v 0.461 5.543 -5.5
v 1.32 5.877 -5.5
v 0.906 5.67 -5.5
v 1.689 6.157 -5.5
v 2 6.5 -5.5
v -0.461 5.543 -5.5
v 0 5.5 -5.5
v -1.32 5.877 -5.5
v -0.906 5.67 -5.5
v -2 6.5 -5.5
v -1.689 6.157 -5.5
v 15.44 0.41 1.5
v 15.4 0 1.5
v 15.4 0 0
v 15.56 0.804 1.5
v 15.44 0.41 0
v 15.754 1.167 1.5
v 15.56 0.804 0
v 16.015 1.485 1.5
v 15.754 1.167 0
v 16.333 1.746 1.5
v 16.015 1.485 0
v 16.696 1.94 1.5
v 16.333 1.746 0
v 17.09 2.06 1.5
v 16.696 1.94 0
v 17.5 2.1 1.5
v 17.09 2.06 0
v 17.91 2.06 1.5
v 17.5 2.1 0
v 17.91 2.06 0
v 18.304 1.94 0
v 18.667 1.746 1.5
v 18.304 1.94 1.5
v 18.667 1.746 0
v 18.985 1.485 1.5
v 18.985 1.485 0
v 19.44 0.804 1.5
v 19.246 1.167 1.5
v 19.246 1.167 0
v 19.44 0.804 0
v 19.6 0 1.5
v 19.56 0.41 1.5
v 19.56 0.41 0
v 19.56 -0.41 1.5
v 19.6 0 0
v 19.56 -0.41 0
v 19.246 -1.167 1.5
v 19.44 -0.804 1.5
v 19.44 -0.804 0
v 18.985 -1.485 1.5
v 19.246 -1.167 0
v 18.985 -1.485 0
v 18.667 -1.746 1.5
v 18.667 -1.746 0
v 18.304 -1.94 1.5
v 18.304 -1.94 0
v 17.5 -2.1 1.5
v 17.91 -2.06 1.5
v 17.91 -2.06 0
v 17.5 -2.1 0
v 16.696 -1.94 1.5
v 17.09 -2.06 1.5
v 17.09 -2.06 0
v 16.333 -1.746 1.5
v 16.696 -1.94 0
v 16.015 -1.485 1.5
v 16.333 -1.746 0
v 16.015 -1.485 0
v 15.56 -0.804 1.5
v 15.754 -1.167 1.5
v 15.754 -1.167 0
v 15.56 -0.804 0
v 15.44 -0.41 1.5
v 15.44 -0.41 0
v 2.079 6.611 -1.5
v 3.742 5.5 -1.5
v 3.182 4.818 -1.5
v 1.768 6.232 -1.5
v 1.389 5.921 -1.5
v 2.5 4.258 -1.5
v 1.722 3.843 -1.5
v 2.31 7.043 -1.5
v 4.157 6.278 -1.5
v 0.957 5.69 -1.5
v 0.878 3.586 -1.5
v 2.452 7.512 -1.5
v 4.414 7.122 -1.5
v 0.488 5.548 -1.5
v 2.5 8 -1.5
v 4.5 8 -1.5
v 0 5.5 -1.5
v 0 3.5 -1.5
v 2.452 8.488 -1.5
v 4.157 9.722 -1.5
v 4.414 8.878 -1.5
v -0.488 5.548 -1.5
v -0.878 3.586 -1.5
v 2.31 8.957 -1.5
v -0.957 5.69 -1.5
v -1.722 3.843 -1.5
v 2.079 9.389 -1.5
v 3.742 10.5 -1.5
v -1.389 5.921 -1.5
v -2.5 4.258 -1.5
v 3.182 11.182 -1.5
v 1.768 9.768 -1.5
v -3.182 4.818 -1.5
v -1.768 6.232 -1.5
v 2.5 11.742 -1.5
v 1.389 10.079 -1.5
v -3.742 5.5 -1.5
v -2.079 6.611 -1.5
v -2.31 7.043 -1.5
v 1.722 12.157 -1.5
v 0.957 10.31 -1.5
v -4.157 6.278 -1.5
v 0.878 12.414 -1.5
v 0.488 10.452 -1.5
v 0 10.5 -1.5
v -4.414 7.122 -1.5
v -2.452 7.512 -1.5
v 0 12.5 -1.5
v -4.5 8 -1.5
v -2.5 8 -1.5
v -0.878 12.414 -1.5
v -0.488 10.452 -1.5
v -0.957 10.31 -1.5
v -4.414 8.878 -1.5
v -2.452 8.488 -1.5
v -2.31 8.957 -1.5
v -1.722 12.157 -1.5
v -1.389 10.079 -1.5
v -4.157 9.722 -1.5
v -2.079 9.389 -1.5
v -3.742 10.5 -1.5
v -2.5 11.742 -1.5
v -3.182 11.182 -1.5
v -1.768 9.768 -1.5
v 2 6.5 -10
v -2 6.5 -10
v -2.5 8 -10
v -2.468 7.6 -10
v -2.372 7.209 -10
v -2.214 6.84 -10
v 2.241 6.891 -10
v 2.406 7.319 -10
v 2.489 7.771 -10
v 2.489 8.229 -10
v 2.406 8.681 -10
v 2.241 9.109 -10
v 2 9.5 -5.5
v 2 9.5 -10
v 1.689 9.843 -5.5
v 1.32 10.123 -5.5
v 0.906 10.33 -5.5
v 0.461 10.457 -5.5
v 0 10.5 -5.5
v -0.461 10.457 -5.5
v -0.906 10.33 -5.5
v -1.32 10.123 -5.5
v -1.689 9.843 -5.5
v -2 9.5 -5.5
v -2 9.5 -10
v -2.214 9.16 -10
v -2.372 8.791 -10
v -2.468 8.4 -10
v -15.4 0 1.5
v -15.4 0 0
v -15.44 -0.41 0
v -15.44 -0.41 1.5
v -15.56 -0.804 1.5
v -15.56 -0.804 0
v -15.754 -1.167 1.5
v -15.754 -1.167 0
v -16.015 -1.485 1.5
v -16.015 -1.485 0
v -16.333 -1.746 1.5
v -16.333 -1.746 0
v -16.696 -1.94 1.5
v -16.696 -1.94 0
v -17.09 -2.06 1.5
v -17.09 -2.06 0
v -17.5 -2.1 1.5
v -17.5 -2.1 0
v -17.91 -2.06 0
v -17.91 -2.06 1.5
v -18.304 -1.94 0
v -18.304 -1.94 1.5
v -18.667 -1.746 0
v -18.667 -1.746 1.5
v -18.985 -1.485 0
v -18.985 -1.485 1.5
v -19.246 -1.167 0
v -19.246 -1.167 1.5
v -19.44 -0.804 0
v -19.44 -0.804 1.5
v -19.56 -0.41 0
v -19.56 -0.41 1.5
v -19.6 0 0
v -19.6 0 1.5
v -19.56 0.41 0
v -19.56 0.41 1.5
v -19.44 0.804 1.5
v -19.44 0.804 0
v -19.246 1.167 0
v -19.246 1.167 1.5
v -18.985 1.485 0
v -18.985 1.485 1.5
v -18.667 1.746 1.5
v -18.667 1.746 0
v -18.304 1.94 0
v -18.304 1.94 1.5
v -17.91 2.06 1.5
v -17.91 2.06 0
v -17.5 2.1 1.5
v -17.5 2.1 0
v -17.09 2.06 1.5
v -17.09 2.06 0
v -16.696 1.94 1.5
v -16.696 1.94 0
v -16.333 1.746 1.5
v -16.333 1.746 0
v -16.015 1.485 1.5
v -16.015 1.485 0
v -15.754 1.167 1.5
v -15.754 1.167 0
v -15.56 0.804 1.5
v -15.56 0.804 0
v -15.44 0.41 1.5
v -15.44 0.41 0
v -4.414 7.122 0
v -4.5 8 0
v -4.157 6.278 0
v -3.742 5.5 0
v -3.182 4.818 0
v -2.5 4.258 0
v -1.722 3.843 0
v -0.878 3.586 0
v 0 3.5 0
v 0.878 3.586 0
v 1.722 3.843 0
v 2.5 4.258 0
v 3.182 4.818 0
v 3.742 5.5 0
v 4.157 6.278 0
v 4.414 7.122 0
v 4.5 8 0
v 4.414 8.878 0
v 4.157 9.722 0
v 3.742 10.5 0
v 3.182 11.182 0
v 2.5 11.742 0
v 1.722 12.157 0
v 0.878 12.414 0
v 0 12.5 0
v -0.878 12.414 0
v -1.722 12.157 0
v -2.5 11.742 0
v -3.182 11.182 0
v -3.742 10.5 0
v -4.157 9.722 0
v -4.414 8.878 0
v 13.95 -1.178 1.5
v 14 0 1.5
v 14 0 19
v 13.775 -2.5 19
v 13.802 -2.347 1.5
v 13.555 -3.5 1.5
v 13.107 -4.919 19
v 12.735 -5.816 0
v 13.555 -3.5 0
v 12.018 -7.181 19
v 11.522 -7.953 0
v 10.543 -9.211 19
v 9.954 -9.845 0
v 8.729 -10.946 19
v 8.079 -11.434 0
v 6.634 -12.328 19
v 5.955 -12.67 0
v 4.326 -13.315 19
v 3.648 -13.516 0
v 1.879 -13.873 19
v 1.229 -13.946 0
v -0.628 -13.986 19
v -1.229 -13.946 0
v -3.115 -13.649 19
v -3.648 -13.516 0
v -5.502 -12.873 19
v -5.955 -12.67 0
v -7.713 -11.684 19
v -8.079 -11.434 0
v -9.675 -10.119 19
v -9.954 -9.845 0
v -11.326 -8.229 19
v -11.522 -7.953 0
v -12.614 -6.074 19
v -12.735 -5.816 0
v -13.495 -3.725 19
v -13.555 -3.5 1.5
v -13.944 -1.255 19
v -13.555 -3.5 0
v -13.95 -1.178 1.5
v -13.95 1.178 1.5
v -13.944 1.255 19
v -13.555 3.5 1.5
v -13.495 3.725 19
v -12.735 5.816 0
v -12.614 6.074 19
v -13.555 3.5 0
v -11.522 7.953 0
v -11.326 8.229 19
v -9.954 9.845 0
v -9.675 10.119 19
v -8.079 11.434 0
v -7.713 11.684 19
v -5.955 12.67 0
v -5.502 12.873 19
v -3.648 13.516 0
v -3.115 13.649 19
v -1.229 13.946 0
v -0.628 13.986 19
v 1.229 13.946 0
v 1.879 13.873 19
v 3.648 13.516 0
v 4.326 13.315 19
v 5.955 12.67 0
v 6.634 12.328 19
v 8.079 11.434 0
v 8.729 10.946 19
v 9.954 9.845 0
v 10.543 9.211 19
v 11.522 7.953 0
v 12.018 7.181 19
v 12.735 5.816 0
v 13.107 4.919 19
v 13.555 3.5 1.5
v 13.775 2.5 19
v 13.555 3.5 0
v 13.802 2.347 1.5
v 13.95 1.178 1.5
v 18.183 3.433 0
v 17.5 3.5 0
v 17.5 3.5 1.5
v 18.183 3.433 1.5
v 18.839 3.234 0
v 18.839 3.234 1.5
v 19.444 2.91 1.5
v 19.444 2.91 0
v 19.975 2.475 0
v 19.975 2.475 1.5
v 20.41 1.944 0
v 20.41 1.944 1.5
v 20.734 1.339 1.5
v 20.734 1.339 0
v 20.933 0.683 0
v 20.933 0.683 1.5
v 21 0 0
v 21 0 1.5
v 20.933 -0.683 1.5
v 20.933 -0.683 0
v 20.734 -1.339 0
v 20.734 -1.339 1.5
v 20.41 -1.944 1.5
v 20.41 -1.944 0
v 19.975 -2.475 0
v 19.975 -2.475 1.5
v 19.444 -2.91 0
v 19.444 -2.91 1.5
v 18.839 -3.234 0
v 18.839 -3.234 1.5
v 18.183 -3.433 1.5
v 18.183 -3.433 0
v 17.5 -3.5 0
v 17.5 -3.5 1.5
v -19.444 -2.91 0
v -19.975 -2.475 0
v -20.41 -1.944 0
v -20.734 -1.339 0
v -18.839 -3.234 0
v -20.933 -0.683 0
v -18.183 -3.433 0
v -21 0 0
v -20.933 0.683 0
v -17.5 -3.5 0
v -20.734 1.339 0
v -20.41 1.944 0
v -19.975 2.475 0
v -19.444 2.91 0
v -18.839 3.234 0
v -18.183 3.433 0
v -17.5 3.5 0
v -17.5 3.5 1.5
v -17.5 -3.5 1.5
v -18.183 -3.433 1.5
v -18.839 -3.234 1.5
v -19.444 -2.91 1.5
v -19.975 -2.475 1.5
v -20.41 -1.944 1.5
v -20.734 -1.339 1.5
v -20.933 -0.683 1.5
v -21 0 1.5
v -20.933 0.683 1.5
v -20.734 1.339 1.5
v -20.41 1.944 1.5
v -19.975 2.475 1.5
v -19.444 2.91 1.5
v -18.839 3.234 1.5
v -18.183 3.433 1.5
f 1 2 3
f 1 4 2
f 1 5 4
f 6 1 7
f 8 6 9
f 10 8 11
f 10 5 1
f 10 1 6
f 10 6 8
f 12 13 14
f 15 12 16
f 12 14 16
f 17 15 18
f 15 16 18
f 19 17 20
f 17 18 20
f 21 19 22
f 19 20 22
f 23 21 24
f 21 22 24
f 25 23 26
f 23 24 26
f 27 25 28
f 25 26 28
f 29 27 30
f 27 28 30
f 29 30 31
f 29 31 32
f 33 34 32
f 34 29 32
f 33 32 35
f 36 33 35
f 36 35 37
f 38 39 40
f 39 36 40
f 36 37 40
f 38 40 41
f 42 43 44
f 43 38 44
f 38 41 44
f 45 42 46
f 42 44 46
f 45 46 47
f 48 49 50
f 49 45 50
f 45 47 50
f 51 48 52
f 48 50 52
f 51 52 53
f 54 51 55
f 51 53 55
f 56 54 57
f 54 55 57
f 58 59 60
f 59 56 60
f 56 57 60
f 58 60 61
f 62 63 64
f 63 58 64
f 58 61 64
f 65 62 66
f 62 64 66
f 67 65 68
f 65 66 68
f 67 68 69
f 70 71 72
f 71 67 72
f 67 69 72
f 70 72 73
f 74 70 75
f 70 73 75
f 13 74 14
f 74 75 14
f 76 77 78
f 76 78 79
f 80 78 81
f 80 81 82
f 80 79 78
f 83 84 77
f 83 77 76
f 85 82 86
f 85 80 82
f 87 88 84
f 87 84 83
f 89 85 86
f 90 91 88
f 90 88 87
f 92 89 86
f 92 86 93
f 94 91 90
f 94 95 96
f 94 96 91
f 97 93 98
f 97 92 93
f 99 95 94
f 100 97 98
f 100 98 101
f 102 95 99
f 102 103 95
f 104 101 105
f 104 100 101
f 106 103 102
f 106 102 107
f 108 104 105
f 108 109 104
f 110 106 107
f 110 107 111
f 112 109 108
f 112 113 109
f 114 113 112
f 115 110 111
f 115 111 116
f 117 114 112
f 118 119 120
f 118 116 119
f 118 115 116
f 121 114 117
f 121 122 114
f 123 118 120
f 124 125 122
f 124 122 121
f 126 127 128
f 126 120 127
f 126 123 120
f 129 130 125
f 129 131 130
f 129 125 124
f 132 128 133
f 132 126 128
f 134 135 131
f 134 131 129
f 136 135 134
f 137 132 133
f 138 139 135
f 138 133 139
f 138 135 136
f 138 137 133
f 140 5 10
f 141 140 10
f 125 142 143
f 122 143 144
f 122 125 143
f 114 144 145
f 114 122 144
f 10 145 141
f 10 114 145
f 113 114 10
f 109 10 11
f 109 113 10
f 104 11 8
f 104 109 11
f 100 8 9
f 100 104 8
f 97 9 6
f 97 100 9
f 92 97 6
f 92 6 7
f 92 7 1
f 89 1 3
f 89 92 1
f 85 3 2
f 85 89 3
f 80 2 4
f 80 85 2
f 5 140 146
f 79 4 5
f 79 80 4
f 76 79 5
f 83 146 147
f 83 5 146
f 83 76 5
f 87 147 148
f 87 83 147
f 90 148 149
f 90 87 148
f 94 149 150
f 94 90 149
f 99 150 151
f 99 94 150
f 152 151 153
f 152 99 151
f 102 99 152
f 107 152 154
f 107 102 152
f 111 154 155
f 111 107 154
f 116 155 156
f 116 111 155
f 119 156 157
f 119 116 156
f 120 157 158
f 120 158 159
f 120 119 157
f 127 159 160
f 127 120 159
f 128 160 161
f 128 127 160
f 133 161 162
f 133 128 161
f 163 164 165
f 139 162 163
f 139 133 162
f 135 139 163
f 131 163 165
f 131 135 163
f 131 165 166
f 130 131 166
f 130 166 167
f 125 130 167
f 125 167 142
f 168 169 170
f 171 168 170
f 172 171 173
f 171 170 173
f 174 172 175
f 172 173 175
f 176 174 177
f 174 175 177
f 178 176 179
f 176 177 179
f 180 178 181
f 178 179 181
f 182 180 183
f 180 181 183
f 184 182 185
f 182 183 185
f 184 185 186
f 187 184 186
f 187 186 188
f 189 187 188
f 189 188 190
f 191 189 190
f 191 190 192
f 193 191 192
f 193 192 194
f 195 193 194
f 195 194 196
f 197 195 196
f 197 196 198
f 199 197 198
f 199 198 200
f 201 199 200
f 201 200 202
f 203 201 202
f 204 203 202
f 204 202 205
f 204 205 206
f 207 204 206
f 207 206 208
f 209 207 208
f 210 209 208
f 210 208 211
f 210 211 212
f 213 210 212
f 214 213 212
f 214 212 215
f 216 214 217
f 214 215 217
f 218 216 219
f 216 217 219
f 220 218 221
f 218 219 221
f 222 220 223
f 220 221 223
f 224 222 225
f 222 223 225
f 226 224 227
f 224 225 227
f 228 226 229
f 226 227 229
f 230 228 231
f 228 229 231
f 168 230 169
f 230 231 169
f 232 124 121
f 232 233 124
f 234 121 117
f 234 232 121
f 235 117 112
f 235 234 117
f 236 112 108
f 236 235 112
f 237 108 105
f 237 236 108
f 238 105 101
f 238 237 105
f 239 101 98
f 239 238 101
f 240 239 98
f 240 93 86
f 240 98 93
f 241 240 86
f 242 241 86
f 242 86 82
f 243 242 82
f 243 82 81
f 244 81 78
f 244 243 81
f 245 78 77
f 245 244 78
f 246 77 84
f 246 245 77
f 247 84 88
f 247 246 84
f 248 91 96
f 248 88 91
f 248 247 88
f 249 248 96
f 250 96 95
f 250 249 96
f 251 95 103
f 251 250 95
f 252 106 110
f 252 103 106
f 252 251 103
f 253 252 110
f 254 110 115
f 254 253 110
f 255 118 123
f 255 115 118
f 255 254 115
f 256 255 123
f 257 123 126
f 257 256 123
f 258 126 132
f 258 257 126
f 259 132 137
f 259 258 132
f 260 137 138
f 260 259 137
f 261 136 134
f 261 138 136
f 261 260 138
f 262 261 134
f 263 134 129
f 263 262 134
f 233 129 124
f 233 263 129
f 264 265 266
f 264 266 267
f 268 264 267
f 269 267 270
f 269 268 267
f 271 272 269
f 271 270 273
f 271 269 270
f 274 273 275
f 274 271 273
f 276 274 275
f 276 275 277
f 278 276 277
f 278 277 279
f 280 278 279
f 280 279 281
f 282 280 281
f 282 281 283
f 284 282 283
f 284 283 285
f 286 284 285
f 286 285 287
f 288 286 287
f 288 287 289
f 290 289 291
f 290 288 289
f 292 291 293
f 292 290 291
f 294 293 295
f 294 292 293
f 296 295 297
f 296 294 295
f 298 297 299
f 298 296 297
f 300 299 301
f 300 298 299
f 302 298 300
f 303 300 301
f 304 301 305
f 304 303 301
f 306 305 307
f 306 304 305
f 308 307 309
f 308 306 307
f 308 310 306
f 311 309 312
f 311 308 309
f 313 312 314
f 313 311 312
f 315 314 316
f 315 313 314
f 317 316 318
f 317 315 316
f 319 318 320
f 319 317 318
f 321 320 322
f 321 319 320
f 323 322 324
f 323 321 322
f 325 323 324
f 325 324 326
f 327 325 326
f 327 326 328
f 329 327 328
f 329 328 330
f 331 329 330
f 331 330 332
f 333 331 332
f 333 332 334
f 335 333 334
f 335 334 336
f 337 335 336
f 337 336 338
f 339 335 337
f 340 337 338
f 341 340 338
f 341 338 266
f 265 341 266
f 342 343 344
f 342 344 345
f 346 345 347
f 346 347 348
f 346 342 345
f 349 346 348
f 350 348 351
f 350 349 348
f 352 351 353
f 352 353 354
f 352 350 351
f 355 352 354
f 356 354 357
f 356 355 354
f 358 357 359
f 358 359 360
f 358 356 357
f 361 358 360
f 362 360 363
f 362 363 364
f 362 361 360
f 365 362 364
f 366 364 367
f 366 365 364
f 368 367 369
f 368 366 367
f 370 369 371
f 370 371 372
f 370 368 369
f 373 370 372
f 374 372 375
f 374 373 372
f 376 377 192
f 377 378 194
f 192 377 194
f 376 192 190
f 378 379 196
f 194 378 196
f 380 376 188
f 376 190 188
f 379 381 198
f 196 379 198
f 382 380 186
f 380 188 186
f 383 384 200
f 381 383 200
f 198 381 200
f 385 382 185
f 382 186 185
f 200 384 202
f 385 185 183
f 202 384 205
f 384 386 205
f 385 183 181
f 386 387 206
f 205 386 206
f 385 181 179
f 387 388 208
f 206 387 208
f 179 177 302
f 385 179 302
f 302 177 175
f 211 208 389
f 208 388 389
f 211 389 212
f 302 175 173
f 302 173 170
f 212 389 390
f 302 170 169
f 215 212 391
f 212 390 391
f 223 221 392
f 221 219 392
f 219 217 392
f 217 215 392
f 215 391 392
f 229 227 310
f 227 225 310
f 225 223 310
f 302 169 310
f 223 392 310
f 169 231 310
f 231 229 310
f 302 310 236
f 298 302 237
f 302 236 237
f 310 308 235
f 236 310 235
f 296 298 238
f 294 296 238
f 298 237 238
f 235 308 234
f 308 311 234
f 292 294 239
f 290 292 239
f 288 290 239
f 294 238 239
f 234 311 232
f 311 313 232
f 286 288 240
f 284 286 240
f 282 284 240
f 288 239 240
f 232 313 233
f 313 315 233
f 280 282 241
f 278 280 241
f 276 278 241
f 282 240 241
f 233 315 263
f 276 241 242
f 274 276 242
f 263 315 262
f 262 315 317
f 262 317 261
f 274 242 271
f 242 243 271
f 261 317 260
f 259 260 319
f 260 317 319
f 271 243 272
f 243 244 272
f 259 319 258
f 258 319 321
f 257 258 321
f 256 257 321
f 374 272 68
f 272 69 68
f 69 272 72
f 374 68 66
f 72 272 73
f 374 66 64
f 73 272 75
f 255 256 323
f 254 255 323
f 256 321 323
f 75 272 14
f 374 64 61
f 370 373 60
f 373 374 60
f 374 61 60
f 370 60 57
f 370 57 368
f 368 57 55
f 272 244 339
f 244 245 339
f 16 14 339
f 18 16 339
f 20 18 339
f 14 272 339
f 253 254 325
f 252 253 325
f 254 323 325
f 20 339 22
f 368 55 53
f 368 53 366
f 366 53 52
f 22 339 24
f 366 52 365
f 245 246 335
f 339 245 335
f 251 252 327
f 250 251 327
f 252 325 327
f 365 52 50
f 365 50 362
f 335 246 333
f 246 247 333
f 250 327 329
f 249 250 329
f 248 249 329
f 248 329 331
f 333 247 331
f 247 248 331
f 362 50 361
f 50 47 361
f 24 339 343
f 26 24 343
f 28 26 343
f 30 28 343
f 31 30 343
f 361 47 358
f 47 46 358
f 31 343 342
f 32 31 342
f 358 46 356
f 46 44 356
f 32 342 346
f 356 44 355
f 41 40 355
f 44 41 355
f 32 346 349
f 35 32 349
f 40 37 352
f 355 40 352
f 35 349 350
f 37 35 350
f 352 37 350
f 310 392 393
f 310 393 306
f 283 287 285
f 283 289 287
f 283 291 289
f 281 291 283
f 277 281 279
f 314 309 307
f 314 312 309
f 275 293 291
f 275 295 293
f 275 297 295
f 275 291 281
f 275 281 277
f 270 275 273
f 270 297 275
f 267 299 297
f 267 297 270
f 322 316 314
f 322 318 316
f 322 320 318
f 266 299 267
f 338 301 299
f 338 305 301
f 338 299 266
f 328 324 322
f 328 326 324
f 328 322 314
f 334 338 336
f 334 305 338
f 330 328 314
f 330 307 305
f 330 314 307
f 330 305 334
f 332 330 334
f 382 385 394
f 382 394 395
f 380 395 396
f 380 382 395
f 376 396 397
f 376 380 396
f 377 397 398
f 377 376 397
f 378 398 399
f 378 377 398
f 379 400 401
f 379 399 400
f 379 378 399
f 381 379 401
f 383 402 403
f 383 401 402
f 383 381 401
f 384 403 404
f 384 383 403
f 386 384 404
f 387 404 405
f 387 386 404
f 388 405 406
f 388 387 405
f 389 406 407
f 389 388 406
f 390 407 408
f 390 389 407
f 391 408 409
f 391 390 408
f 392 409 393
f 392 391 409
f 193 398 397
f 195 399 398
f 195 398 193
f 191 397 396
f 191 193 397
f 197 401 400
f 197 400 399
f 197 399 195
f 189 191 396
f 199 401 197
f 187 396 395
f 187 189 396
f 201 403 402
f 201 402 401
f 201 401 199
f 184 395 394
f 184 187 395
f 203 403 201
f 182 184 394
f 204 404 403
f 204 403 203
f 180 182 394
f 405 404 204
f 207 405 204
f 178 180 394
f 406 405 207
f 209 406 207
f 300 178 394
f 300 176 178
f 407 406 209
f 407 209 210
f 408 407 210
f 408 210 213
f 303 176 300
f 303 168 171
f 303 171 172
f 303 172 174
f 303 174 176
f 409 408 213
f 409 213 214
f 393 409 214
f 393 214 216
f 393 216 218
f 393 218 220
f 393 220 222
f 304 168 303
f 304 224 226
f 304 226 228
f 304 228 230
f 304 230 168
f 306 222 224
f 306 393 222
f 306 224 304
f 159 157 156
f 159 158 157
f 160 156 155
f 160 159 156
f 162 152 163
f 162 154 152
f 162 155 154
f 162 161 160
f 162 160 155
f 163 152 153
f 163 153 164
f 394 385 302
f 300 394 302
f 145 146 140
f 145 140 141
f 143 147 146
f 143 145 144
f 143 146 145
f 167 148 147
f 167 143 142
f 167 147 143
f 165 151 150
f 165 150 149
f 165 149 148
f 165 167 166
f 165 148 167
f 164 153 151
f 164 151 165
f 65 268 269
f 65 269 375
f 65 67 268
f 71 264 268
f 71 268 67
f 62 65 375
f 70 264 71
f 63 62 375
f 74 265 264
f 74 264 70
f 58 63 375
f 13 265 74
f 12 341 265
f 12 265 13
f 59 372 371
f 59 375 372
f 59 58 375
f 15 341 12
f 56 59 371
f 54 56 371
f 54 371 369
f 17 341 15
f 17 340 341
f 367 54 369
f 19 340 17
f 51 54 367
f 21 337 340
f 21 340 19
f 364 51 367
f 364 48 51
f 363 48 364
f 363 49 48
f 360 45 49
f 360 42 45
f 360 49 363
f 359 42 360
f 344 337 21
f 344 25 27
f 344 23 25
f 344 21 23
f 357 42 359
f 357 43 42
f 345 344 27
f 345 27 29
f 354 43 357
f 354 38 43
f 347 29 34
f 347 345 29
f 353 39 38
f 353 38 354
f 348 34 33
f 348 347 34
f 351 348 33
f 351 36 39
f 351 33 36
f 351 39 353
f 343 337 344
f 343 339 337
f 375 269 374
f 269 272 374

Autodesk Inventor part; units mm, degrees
ref_plane "YZ Plane" through (0, 0, 0) normal (1, 0, 0) x (0, 1, 0)
ref_plane "XZ Plane" through (0, 0, 0) normal (0, 1, 0) x (-1, 0, 0)
ref_plane "XY Plane" through (0, 0, 0) normal (0, 0, 1) x (1, 0, 0)
sketch "Sketch1" plane through (0, 0, 0) normal (0, 0, 1) x (1, 0, 0)
  circle A0 centre (0, 0) radius 14
  line L0 (0, 14) -> (0, -14)
  line L1 (-17.5, 9.3538) -> (-17.5, -9.6398)
  circle A1 centre (-17.5, 0) radius 2.1
  arc A2 (-17.5, 3.5) -> (-17.5, -3.5) centre (-17.5, 0) ccw
  line L2 (-17.5, 3.5) -> (-13.5554, 3.5)
  line L3 (-17.5, -3.5) -> (-13.5554, -3.5)
  dimension "d0" = 28
  dimension "d1" = 17.5
  dimension "d2" = 4.2
  dimension "d5" = 7
extrude "Extrusion1" add sketch "Sketch1" along normal blind 19 contours A0 L0 | L0 A0
extrude "Extrusion2" add sketch "Sketch1" along normal blind 1.5 contours A0 L3 L1 A1 L2 | L1 A1 A2
mirror "Mirror1" about plane through (0, 0, 0) normal (1, 0, 0) of "Extrusion2"
sketch "Sketch3" plane through (0, 0, 0) normal (0, 0, -1) x (-1, 0, 0)
  circle A0 centre (0, 8) radius 4.5
  circle A1 centre (0, 8) radius 2.5
  line L0 (-2, 9.5) -> (2, 9.5)
  line L1 (-2, 6.5) -> (2, 6.5)
  point P0 (0, 0)
  point P1 (0, 10.5)
  point P2 (0, 5.5)
  dimension "d8" = 9
  dimension "d9" = 8
  dimension "d10" = 5
  dimension "d12" = 1
  dimension "d13" = 1
extrude "Extrusion3" add sketch "Sketch3" along normal blind 1.5 contours A0 | A1 L1 L0 | L0 A1 | A1 L1
extrude "Extrusion4" add sketch "Sketch3" along normal blind 5.5 contours A1 L1 L0 | L0 A1 | A1 L1
extrude "Extrusion5" add sketch "Sketch3" along normal blind 10 contours A1 L1 L0
properties part number "motooor"
